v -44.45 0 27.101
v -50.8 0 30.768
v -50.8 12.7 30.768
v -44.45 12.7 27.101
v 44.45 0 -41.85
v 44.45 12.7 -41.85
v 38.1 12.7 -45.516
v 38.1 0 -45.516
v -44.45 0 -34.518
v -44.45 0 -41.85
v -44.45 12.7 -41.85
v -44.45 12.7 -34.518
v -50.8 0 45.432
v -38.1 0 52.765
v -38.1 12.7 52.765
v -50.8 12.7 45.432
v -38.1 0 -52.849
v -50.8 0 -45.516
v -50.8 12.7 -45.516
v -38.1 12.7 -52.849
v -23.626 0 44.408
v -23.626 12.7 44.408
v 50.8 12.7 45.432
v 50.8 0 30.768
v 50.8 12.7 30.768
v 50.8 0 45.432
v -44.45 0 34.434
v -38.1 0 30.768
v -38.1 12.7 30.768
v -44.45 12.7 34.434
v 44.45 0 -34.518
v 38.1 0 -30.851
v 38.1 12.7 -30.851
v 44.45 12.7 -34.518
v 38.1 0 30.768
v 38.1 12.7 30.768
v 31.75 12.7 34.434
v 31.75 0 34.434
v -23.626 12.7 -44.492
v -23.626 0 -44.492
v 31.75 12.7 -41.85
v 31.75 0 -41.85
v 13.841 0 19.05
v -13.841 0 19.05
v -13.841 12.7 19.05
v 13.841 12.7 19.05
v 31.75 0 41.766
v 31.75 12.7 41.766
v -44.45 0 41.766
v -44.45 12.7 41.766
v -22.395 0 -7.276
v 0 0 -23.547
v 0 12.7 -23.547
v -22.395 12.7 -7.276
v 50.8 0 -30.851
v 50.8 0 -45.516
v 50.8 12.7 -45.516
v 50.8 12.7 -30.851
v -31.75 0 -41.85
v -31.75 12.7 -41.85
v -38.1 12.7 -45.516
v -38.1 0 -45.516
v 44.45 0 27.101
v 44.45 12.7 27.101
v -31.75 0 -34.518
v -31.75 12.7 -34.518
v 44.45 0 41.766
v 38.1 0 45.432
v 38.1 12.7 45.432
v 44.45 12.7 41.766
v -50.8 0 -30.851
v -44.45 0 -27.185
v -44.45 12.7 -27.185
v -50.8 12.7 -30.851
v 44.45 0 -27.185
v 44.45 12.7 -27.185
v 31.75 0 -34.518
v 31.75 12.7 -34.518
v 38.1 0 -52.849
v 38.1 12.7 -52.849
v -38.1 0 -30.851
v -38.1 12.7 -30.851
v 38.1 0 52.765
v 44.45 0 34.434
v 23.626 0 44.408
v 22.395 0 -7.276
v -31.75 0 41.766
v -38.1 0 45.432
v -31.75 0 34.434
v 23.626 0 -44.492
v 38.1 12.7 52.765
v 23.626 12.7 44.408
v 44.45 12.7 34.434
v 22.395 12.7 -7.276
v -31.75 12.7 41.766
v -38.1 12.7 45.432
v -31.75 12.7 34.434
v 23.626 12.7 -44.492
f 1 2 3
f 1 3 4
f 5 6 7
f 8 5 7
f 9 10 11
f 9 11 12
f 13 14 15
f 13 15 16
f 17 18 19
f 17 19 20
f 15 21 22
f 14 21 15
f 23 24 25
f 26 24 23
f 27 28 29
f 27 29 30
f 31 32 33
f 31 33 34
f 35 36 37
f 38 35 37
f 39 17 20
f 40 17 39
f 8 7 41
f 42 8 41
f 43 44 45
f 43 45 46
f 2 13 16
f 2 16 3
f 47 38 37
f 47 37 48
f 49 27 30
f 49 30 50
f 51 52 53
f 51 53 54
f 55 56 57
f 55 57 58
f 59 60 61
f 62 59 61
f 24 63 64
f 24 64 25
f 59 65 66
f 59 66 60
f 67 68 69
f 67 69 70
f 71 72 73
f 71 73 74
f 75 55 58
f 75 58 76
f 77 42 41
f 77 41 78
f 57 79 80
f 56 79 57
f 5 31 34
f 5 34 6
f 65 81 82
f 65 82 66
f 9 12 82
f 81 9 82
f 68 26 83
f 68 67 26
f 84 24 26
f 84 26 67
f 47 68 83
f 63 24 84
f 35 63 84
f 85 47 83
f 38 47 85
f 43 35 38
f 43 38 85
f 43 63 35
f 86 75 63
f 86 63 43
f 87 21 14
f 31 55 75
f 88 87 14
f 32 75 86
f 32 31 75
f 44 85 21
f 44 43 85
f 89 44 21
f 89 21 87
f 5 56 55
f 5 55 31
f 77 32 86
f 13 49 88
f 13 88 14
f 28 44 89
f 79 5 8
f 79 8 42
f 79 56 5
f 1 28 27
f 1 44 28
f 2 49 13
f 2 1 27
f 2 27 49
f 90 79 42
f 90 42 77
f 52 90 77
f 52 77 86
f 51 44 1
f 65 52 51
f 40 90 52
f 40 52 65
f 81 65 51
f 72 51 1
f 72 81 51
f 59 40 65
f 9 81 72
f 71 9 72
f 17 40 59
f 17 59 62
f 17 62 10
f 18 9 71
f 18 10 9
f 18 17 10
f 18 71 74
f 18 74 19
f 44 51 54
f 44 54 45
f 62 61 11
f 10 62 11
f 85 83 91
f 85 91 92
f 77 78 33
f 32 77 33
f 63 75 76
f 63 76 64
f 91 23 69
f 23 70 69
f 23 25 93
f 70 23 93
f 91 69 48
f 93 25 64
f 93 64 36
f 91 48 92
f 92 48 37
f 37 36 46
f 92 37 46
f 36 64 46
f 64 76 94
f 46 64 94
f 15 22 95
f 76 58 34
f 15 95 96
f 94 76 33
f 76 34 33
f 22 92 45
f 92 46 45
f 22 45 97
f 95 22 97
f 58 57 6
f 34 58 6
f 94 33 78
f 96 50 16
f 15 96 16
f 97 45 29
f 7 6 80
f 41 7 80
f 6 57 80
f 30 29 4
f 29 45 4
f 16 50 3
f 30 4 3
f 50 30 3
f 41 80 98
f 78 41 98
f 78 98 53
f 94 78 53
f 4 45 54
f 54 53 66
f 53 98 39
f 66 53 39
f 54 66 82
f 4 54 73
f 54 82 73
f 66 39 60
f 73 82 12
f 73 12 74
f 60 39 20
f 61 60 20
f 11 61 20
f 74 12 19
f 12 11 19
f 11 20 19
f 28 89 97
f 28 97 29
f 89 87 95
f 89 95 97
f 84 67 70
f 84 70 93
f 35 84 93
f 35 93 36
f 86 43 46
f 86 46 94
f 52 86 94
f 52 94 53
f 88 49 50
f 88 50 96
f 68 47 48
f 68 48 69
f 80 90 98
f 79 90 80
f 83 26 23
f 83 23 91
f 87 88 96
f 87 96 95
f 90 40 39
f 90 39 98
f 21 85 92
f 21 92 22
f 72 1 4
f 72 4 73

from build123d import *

# Parameters (mm, degrees)
BOSS_EXTRUDE1_DEPTH = 12.7


with BuildPart() as part:
    # Sketch2 → Boss-Extrude1 (new body)
    with BuildSketch(Plane(origin=(0, 0, 0), x_dir=(1, 0, 0), z_dir=(0, 1, 0))):
        Polygon((-23.625933555, 44.491909321), (23.625933555, 44.491909321), (38.1, 52.84851548), (50.8, 45.516167061), (50.8, 30.851470224), (44.45, 27.185296014), (44.45, -27.101477372), (50.8, -30.767651581), (50.8, -45.432348419), (38.1, -52.764696837), (23.625933555, -44.408090679), (-23.625933555, -44.408090679), (-38.1, -52.764696837), (-50.8, -45.432348419), (-50.8, -30.767651581), (-44.45, -27.101477372), (-44.45, 27.185296014), (-50.8, 30.851470224), (-50.8, 45.516167061), (-38.1, 52.84851548), align=None)
        Polygon((-38.1, 45.516167061), (-44.45, 41.849992852), (-44.45, 34.517644433), (-38.1, 30.851470224), (-31.75, 34.517644433), (-31.75, 41.849992852), align=None, mode=Mode.SUBTRACT)
        Polygon((38.1, 45.516167061), (31.75, 41.849992852), (31.75, 34.517644433), (38.1, 30.851470224), (44.45, 34.517644433), (44.45, 41.849992852), align=None, mode=Mode.SUBTRACT)
        Polygon((-38.1, -30.767651581), (-44.45, -34.433825791), (-44.45, -41.766174209), (-38.1, -45.432348419), (-31.75, -41.766174209), (-31.75, -34.433825791), align=None, mode=Mode.SUBTRACT)
        Polygon((38.1, -30.767651581), (31.75, -34.433825791), (31.75, -41.766174209), (38.1, -45.432348419), (44.45, -41.766174209), (44.45, -34.433825791), align=None, mode=Mode.SUBTRACT)
        Polygon((0, 23.547094971), (-22.394618112, 7.276452514), (-13.840635159, -19.05), (13.840635159, -19.05), (22.394618112, 7.276452514), align=None, mode=Mode.SUBTRACT)
    extrude(amount=BOSS_EXTRUDE1_DEPTH)


solid = part.part
